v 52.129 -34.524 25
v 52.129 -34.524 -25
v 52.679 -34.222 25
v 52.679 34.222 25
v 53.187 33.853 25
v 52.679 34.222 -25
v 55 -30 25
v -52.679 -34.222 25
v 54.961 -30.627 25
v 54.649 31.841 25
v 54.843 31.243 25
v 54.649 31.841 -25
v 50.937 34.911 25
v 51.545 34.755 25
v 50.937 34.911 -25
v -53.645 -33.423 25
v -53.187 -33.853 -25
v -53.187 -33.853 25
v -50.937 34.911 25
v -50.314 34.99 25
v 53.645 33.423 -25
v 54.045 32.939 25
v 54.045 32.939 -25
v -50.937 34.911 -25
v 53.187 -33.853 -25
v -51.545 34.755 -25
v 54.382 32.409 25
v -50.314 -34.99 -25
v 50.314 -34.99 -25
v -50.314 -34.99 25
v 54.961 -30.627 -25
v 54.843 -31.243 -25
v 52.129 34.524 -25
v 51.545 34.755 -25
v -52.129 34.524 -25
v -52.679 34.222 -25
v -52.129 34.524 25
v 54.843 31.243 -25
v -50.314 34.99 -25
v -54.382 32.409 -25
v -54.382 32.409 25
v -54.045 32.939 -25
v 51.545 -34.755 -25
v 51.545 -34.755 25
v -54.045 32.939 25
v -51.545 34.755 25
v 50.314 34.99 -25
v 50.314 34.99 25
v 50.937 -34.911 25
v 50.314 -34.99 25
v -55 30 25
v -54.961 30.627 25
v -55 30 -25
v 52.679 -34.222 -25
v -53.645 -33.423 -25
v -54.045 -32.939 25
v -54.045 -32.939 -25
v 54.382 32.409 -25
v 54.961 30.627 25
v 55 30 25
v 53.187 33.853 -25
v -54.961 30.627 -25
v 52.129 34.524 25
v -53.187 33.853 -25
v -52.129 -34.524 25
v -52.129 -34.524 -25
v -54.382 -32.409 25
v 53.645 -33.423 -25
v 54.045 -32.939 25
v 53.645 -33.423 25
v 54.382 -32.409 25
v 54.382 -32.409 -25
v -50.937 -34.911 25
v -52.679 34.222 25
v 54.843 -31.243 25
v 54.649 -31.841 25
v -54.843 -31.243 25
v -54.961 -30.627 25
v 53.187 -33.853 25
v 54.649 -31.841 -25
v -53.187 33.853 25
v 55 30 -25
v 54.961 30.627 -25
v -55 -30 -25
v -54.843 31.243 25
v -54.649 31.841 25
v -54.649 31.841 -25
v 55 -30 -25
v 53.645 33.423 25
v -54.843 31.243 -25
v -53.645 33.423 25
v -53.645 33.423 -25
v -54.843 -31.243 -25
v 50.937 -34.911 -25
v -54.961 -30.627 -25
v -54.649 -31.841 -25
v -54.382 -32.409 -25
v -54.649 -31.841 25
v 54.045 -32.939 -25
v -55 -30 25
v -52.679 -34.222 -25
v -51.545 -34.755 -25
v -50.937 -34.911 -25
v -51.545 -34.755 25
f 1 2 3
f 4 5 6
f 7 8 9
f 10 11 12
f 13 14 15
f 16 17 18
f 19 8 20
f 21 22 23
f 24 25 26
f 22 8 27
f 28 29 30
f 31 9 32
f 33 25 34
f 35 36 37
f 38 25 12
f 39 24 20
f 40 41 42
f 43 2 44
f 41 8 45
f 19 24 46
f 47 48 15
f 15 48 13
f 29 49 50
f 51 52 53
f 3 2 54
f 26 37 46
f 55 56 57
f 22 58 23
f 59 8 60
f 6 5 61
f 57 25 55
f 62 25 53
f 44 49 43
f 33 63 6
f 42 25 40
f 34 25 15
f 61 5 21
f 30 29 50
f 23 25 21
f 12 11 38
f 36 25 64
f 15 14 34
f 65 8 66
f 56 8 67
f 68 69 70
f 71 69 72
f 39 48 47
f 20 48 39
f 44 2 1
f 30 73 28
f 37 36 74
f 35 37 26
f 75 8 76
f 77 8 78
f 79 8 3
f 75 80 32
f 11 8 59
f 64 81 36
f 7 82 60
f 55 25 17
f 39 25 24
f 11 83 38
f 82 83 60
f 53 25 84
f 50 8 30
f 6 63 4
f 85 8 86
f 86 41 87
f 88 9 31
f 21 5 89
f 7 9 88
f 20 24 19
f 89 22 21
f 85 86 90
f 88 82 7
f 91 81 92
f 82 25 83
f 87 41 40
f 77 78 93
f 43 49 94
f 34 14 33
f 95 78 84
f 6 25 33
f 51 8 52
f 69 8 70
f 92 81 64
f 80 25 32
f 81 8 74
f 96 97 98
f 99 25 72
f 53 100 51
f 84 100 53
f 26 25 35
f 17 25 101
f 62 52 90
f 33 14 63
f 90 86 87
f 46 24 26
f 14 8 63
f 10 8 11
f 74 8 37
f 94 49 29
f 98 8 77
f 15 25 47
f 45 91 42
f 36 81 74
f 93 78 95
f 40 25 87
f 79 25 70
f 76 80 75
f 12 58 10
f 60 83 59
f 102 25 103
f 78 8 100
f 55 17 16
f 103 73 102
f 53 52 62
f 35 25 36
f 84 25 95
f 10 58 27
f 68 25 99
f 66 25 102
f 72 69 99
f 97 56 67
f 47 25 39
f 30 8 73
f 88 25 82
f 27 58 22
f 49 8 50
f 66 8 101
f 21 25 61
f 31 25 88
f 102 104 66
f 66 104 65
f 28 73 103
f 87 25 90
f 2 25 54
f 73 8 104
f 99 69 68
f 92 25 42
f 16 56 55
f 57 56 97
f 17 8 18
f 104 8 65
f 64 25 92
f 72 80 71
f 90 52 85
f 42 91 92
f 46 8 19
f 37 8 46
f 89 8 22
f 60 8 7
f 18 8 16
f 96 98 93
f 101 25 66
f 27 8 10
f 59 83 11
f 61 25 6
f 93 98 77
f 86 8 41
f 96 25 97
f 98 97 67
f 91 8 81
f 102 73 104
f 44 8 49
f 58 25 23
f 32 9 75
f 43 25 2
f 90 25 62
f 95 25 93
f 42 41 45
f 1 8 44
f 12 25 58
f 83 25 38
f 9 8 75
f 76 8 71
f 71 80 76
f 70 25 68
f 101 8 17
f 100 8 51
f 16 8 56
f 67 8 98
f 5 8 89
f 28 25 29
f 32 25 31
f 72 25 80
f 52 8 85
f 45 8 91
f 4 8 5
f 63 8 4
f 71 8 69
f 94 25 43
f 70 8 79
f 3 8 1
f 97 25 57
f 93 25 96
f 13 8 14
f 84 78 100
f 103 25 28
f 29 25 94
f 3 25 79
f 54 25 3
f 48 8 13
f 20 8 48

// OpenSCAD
$fn=50;
//difference()
minkowski()
{
    cylinder(25,d1=10,d2=10,center=true);
    cube([100,60,25], true);    
    //sphere(10,true);    
}
